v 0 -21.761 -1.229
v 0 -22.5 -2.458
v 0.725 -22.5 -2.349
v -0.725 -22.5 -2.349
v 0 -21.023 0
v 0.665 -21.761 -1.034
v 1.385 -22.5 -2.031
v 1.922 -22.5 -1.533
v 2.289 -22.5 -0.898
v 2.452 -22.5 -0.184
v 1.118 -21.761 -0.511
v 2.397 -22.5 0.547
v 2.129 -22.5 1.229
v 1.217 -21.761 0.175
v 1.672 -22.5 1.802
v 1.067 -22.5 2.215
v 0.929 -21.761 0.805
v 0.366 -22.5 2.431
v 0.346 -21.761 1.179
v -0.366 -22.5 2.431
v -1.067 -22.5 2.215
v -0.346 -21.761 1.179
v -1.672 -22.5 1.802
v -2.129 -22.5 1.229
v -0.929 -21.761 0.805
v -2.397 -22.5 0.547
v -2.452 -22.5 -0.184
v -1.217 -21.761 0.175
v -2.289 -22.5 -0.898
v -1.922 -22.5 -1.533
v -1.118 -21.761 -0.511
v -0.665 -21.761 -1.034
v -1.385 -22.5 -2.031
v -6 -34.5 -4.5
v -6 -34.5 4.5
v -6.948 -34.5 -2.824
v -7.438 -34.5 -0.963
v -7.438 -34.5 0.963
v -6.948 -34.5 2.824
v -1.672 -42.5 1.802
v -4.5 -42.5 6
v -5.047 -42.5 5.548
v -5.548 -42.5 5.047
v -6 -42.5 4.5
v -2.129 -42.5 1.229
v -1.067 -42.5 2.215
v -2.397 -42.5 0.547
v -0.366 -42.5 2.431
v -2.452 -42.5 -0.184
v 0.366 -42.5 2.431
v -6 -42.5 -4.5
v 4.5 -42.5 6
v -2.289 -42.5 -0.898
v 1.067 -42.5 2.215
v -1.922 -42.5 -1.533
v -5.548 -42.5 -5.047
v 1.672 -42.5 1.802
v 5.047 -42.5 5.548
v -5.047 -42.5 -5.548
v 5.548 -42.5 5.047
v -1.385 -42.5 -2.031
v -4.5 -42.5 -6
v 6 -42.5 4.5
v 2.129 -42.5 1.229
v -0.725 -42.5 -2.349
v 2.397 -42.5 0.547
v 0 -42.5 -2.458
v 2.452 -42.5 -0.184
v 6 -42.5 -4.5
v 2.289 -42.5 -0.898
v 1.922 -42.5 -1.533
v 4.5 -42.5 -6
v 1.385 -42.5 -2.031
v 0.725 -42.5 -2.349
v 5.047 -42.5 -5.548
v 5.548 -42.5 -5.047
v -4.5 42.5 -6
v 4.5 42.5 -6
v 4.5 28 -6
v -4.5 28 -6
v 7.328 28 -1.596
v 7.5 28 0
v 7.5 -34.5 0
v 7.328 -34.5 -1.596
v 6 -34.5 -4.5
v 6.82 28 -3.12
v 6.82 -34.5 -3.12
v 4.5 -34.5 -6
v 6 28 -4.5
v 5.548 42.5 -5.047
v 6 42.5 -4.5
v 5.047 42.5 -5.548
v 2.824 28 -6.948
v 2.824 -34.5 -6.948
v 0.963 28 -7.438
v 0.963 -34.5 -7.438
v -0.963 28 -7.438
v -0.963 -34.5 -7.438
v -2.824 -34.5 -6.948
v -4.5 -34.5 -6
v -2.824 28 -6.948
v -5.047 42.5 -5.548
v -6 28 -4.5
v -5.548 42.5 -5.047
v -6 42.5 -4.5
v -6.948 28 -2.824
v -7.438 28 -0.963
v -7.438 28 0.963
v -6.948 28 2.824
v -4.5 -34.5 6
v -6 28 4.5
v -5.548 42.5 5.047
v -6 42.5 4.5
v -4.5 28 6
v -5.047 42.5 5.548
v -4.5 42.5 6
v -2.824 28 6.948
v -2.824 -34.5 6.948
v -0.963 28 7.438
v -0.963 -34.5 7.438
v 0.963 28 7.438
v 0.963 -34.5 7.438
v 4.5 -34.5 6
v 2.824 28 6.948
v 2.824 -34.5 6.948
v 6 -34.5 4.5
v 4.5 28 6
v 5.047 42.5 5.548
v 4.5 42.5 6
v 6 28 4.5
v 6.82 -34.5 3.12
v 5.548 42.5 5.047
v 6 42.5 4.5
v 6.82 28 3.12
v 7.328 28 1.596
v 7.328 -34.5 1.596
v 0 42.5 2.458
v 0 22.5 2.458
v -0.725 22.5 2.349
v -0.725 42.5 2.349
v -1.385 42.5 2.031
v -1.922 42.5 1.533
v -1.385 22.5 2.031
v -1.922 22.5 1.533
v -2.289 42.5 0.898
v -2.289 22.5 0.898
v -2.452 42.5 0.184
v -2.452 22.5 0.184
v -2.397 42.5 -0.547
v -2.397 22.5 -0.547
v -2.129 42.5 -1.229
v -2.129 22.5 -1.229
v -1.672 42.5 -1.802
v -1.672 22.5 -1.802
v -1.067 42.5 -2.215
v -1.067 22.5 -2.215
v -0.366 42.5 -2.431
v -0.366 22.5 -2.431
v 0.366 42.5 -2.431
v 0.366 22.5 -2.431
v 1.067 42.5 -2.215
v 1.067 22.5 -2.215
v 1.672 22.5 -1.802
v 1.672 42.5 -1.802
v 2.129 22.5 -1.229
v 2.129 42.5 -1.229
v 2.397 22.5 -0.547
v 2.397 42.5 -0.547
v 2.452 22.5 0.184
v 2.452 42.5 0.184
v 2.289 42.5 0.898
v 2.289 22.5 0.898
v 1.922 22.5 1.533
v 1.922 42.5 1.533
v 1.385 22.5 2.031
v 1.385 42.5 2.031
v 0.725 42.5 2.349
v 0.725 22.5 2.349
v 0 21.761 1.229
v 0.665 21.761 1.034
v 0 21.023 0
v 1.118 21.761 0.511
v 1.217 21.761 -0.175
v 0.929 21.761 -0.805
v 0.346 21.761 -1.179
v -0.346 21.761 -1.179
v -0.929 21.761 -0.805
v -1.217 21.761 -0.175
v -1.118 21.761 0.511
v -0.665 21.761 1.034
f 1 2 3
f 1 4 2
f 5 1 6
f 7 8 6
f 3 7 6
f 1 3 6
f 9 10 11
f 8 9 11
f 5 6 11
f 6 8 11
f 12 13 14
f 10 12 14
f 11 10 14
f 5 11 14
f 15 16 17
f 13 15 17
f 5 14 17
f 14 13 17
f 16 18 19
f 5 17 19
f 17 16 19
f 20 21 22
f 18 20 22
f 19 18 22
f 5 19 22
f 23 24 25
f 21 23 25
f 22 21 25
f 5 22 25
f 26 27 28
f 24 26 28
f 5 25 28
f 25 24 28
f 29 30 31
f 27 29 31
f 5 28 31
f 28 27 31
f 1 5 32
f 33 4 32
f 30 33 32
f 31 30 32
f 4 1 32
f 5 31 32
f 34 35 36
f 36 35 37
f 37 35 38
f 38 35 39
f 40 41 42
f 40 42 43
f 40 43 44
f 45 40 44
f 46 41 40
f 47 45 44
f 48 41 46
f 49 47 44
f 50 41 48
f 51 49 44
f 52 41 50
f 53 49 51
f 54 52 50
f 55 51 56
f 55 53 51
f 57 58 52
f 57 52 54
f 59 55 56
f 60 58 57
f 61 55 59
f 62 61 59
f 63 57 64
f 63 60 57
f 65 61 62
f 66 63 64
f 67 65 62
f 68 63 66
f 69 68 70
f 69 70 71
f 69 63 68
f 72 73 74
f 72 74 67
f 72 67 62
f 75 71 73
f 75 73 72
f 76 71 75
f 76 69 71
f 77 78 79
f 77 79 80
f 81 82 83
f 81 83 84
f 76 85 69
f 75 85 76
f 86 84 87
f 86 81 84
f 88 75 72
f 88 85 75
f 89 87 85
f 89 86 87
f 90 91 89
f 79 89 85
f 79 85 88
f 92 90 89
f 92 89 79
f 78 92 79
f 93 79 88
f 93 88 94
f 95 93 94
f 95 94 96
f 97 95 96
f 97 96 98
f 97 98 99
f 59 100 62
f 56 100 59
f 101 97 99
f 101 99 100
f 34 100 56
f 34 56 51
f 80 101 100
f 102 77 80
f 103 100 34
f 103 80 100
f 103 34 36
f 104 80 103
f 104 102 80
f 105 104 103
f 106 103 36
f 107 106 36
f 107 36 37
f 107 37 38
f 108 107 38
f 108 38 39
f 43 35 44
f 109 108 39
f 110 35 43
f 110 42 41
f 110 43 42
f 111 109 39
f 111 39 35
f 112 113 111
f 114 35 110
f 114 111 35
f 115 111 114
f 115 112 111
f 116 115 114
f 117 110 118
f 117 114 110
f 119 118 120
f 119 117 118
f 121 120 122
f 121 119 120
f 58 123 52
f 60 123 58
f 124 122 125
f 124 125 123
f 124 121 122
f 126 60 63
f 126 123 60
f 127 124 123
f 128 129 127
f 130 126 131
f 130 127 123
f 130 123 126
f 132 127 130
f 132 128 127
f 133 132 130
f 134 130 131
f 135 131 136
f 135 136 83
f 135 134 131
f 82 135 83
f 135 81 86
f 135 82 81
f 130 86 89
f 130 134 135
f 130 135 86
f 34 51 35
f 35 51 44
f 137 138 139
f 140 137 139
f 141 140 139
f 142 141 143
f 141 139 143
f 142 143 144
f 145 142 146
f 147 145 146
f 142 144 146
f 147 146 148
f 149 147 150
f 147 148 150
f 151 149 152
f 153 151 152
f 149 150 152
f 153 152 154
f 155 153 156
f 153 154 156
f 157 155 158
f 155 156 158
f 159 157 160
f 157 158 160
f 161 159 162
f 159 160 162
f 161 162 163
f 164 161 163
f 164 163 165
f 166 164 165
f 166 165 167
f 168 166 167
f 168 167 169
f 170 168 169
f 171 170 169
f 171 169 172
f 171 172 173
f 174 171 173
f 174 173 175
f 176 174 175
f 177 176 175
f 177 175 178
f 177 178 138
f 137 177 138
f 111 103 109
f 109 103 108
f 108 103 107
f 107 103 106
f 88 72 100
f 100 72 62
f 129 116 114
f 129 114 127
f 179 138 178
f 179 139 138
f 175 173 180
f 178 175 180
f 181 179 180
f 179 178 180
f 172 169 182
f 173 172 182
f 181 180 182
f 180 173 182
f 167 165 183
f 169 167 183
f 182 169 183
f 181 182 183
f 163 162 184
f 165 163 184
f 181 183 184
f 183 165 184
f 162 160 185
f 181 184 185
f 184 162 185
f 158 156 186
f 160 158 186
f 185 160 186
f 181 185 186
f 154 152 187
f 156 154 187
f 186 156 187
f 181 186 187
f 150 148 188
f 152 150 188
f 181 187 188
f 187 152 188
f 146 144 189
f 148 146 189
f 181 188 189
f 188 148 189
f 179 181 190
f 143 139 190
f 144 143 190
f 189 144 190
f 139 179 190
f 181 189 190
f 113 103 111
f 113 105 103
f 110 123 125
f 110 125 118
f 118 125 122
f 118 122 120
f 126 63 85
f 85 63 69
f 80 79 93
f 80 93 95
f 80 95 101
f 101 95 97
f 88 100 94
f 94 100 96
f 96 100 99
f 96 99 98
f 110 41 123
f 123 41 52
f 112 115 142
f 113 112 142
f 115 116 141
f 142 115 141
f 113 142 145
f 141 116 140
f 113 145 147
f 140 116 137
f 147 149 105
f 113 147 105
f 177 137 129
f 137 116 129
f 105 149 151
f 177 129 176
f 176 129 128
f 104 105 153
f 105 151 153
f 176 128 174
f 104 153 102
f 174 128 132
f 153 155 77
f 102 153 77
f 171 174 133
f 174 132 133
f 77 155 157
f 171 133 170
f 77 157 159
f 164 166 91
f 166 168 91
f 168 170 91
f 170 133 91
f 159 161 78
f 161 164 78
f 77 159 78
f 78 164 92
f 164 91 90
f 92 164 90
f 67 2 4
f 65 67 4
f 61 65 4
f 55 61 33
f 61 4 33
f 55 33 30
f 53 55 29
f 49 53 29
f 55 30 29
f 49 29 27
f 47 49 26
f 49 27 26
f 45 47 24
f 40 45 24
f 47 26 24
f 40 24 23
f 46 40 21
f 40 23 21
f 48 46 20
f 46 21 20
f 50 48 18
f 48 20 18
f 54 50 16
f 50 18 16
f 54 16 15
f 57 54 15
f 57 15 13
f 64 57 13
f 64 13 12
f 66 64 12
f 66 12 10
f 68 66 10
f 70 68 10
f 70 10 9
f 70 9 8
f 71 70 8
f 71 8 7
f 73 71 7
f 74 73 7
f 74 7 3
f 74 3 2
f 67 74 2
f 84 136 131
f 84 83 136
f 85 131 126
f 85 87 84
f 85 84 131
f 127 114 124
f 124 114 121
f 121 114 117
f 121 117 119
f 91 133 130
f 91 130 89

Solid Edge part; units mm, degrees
sketch "Sketch1" plane through (0, 0, 0) normal (0, -1, 0) x (1, 0, 0)
  circle A0 centre (0, 0) radius 7.5
  dimension "D1" = 15
extrude "Protrusion1" add sketch "Sketch1" along normal mid plane 85
sketch "Sketch2" plane through (0, 42.5, 0) normal (0, 1, 0) x (-1, 0, 0)
  line L0 (-6, -6) -> (6, -6)
  line L1 (6, -6) -> (6, 6)
  line L2 (6, 6) -> (-6, 6)
  line L3 (-6, 6) -> (-6, -6)
  circle A0 centre (0, 0) radius 13.0133
  dimension "D1" = 12
  dimension "D2" = 12
extrude "VaciadoExtruido_1" cut sketch "Sketch2" against normal blind 14.5
sketch "Sketch3" plane through (0, -42.5, 0) normal (0, -1, 0) x (1, 0, 0)
  line L0 (-6, 6) -> (6, 6)
  line L1 (6, 6) -> (6, -6)
  line L2 (6, -6) -> (-6, -6)
  line L3 (-6, -6) -> (-6, 6)
  circle A0 centre (0, 0) radius 11.8387
  dimension "D1" = 12
  dimension "D2" = 12
extrude "VaciadoExtruido_2" cut sketch "Sketch3" against normal blind 8
hole "Agujero_1" at (0, 42.5, 0) direction (0, -1, 0) diameter 4.917 depth 20 tip angle 118 thread major 6 thread length 15
hole "Agujero_2" at (0, -42.5, 0) direction (0, 1, 0) diameter 4.917 depth 20 tip angle 118 thread major 6 thread length 15
properties part number "1976-1200-003" material "Aluminio, 7075-T6"
